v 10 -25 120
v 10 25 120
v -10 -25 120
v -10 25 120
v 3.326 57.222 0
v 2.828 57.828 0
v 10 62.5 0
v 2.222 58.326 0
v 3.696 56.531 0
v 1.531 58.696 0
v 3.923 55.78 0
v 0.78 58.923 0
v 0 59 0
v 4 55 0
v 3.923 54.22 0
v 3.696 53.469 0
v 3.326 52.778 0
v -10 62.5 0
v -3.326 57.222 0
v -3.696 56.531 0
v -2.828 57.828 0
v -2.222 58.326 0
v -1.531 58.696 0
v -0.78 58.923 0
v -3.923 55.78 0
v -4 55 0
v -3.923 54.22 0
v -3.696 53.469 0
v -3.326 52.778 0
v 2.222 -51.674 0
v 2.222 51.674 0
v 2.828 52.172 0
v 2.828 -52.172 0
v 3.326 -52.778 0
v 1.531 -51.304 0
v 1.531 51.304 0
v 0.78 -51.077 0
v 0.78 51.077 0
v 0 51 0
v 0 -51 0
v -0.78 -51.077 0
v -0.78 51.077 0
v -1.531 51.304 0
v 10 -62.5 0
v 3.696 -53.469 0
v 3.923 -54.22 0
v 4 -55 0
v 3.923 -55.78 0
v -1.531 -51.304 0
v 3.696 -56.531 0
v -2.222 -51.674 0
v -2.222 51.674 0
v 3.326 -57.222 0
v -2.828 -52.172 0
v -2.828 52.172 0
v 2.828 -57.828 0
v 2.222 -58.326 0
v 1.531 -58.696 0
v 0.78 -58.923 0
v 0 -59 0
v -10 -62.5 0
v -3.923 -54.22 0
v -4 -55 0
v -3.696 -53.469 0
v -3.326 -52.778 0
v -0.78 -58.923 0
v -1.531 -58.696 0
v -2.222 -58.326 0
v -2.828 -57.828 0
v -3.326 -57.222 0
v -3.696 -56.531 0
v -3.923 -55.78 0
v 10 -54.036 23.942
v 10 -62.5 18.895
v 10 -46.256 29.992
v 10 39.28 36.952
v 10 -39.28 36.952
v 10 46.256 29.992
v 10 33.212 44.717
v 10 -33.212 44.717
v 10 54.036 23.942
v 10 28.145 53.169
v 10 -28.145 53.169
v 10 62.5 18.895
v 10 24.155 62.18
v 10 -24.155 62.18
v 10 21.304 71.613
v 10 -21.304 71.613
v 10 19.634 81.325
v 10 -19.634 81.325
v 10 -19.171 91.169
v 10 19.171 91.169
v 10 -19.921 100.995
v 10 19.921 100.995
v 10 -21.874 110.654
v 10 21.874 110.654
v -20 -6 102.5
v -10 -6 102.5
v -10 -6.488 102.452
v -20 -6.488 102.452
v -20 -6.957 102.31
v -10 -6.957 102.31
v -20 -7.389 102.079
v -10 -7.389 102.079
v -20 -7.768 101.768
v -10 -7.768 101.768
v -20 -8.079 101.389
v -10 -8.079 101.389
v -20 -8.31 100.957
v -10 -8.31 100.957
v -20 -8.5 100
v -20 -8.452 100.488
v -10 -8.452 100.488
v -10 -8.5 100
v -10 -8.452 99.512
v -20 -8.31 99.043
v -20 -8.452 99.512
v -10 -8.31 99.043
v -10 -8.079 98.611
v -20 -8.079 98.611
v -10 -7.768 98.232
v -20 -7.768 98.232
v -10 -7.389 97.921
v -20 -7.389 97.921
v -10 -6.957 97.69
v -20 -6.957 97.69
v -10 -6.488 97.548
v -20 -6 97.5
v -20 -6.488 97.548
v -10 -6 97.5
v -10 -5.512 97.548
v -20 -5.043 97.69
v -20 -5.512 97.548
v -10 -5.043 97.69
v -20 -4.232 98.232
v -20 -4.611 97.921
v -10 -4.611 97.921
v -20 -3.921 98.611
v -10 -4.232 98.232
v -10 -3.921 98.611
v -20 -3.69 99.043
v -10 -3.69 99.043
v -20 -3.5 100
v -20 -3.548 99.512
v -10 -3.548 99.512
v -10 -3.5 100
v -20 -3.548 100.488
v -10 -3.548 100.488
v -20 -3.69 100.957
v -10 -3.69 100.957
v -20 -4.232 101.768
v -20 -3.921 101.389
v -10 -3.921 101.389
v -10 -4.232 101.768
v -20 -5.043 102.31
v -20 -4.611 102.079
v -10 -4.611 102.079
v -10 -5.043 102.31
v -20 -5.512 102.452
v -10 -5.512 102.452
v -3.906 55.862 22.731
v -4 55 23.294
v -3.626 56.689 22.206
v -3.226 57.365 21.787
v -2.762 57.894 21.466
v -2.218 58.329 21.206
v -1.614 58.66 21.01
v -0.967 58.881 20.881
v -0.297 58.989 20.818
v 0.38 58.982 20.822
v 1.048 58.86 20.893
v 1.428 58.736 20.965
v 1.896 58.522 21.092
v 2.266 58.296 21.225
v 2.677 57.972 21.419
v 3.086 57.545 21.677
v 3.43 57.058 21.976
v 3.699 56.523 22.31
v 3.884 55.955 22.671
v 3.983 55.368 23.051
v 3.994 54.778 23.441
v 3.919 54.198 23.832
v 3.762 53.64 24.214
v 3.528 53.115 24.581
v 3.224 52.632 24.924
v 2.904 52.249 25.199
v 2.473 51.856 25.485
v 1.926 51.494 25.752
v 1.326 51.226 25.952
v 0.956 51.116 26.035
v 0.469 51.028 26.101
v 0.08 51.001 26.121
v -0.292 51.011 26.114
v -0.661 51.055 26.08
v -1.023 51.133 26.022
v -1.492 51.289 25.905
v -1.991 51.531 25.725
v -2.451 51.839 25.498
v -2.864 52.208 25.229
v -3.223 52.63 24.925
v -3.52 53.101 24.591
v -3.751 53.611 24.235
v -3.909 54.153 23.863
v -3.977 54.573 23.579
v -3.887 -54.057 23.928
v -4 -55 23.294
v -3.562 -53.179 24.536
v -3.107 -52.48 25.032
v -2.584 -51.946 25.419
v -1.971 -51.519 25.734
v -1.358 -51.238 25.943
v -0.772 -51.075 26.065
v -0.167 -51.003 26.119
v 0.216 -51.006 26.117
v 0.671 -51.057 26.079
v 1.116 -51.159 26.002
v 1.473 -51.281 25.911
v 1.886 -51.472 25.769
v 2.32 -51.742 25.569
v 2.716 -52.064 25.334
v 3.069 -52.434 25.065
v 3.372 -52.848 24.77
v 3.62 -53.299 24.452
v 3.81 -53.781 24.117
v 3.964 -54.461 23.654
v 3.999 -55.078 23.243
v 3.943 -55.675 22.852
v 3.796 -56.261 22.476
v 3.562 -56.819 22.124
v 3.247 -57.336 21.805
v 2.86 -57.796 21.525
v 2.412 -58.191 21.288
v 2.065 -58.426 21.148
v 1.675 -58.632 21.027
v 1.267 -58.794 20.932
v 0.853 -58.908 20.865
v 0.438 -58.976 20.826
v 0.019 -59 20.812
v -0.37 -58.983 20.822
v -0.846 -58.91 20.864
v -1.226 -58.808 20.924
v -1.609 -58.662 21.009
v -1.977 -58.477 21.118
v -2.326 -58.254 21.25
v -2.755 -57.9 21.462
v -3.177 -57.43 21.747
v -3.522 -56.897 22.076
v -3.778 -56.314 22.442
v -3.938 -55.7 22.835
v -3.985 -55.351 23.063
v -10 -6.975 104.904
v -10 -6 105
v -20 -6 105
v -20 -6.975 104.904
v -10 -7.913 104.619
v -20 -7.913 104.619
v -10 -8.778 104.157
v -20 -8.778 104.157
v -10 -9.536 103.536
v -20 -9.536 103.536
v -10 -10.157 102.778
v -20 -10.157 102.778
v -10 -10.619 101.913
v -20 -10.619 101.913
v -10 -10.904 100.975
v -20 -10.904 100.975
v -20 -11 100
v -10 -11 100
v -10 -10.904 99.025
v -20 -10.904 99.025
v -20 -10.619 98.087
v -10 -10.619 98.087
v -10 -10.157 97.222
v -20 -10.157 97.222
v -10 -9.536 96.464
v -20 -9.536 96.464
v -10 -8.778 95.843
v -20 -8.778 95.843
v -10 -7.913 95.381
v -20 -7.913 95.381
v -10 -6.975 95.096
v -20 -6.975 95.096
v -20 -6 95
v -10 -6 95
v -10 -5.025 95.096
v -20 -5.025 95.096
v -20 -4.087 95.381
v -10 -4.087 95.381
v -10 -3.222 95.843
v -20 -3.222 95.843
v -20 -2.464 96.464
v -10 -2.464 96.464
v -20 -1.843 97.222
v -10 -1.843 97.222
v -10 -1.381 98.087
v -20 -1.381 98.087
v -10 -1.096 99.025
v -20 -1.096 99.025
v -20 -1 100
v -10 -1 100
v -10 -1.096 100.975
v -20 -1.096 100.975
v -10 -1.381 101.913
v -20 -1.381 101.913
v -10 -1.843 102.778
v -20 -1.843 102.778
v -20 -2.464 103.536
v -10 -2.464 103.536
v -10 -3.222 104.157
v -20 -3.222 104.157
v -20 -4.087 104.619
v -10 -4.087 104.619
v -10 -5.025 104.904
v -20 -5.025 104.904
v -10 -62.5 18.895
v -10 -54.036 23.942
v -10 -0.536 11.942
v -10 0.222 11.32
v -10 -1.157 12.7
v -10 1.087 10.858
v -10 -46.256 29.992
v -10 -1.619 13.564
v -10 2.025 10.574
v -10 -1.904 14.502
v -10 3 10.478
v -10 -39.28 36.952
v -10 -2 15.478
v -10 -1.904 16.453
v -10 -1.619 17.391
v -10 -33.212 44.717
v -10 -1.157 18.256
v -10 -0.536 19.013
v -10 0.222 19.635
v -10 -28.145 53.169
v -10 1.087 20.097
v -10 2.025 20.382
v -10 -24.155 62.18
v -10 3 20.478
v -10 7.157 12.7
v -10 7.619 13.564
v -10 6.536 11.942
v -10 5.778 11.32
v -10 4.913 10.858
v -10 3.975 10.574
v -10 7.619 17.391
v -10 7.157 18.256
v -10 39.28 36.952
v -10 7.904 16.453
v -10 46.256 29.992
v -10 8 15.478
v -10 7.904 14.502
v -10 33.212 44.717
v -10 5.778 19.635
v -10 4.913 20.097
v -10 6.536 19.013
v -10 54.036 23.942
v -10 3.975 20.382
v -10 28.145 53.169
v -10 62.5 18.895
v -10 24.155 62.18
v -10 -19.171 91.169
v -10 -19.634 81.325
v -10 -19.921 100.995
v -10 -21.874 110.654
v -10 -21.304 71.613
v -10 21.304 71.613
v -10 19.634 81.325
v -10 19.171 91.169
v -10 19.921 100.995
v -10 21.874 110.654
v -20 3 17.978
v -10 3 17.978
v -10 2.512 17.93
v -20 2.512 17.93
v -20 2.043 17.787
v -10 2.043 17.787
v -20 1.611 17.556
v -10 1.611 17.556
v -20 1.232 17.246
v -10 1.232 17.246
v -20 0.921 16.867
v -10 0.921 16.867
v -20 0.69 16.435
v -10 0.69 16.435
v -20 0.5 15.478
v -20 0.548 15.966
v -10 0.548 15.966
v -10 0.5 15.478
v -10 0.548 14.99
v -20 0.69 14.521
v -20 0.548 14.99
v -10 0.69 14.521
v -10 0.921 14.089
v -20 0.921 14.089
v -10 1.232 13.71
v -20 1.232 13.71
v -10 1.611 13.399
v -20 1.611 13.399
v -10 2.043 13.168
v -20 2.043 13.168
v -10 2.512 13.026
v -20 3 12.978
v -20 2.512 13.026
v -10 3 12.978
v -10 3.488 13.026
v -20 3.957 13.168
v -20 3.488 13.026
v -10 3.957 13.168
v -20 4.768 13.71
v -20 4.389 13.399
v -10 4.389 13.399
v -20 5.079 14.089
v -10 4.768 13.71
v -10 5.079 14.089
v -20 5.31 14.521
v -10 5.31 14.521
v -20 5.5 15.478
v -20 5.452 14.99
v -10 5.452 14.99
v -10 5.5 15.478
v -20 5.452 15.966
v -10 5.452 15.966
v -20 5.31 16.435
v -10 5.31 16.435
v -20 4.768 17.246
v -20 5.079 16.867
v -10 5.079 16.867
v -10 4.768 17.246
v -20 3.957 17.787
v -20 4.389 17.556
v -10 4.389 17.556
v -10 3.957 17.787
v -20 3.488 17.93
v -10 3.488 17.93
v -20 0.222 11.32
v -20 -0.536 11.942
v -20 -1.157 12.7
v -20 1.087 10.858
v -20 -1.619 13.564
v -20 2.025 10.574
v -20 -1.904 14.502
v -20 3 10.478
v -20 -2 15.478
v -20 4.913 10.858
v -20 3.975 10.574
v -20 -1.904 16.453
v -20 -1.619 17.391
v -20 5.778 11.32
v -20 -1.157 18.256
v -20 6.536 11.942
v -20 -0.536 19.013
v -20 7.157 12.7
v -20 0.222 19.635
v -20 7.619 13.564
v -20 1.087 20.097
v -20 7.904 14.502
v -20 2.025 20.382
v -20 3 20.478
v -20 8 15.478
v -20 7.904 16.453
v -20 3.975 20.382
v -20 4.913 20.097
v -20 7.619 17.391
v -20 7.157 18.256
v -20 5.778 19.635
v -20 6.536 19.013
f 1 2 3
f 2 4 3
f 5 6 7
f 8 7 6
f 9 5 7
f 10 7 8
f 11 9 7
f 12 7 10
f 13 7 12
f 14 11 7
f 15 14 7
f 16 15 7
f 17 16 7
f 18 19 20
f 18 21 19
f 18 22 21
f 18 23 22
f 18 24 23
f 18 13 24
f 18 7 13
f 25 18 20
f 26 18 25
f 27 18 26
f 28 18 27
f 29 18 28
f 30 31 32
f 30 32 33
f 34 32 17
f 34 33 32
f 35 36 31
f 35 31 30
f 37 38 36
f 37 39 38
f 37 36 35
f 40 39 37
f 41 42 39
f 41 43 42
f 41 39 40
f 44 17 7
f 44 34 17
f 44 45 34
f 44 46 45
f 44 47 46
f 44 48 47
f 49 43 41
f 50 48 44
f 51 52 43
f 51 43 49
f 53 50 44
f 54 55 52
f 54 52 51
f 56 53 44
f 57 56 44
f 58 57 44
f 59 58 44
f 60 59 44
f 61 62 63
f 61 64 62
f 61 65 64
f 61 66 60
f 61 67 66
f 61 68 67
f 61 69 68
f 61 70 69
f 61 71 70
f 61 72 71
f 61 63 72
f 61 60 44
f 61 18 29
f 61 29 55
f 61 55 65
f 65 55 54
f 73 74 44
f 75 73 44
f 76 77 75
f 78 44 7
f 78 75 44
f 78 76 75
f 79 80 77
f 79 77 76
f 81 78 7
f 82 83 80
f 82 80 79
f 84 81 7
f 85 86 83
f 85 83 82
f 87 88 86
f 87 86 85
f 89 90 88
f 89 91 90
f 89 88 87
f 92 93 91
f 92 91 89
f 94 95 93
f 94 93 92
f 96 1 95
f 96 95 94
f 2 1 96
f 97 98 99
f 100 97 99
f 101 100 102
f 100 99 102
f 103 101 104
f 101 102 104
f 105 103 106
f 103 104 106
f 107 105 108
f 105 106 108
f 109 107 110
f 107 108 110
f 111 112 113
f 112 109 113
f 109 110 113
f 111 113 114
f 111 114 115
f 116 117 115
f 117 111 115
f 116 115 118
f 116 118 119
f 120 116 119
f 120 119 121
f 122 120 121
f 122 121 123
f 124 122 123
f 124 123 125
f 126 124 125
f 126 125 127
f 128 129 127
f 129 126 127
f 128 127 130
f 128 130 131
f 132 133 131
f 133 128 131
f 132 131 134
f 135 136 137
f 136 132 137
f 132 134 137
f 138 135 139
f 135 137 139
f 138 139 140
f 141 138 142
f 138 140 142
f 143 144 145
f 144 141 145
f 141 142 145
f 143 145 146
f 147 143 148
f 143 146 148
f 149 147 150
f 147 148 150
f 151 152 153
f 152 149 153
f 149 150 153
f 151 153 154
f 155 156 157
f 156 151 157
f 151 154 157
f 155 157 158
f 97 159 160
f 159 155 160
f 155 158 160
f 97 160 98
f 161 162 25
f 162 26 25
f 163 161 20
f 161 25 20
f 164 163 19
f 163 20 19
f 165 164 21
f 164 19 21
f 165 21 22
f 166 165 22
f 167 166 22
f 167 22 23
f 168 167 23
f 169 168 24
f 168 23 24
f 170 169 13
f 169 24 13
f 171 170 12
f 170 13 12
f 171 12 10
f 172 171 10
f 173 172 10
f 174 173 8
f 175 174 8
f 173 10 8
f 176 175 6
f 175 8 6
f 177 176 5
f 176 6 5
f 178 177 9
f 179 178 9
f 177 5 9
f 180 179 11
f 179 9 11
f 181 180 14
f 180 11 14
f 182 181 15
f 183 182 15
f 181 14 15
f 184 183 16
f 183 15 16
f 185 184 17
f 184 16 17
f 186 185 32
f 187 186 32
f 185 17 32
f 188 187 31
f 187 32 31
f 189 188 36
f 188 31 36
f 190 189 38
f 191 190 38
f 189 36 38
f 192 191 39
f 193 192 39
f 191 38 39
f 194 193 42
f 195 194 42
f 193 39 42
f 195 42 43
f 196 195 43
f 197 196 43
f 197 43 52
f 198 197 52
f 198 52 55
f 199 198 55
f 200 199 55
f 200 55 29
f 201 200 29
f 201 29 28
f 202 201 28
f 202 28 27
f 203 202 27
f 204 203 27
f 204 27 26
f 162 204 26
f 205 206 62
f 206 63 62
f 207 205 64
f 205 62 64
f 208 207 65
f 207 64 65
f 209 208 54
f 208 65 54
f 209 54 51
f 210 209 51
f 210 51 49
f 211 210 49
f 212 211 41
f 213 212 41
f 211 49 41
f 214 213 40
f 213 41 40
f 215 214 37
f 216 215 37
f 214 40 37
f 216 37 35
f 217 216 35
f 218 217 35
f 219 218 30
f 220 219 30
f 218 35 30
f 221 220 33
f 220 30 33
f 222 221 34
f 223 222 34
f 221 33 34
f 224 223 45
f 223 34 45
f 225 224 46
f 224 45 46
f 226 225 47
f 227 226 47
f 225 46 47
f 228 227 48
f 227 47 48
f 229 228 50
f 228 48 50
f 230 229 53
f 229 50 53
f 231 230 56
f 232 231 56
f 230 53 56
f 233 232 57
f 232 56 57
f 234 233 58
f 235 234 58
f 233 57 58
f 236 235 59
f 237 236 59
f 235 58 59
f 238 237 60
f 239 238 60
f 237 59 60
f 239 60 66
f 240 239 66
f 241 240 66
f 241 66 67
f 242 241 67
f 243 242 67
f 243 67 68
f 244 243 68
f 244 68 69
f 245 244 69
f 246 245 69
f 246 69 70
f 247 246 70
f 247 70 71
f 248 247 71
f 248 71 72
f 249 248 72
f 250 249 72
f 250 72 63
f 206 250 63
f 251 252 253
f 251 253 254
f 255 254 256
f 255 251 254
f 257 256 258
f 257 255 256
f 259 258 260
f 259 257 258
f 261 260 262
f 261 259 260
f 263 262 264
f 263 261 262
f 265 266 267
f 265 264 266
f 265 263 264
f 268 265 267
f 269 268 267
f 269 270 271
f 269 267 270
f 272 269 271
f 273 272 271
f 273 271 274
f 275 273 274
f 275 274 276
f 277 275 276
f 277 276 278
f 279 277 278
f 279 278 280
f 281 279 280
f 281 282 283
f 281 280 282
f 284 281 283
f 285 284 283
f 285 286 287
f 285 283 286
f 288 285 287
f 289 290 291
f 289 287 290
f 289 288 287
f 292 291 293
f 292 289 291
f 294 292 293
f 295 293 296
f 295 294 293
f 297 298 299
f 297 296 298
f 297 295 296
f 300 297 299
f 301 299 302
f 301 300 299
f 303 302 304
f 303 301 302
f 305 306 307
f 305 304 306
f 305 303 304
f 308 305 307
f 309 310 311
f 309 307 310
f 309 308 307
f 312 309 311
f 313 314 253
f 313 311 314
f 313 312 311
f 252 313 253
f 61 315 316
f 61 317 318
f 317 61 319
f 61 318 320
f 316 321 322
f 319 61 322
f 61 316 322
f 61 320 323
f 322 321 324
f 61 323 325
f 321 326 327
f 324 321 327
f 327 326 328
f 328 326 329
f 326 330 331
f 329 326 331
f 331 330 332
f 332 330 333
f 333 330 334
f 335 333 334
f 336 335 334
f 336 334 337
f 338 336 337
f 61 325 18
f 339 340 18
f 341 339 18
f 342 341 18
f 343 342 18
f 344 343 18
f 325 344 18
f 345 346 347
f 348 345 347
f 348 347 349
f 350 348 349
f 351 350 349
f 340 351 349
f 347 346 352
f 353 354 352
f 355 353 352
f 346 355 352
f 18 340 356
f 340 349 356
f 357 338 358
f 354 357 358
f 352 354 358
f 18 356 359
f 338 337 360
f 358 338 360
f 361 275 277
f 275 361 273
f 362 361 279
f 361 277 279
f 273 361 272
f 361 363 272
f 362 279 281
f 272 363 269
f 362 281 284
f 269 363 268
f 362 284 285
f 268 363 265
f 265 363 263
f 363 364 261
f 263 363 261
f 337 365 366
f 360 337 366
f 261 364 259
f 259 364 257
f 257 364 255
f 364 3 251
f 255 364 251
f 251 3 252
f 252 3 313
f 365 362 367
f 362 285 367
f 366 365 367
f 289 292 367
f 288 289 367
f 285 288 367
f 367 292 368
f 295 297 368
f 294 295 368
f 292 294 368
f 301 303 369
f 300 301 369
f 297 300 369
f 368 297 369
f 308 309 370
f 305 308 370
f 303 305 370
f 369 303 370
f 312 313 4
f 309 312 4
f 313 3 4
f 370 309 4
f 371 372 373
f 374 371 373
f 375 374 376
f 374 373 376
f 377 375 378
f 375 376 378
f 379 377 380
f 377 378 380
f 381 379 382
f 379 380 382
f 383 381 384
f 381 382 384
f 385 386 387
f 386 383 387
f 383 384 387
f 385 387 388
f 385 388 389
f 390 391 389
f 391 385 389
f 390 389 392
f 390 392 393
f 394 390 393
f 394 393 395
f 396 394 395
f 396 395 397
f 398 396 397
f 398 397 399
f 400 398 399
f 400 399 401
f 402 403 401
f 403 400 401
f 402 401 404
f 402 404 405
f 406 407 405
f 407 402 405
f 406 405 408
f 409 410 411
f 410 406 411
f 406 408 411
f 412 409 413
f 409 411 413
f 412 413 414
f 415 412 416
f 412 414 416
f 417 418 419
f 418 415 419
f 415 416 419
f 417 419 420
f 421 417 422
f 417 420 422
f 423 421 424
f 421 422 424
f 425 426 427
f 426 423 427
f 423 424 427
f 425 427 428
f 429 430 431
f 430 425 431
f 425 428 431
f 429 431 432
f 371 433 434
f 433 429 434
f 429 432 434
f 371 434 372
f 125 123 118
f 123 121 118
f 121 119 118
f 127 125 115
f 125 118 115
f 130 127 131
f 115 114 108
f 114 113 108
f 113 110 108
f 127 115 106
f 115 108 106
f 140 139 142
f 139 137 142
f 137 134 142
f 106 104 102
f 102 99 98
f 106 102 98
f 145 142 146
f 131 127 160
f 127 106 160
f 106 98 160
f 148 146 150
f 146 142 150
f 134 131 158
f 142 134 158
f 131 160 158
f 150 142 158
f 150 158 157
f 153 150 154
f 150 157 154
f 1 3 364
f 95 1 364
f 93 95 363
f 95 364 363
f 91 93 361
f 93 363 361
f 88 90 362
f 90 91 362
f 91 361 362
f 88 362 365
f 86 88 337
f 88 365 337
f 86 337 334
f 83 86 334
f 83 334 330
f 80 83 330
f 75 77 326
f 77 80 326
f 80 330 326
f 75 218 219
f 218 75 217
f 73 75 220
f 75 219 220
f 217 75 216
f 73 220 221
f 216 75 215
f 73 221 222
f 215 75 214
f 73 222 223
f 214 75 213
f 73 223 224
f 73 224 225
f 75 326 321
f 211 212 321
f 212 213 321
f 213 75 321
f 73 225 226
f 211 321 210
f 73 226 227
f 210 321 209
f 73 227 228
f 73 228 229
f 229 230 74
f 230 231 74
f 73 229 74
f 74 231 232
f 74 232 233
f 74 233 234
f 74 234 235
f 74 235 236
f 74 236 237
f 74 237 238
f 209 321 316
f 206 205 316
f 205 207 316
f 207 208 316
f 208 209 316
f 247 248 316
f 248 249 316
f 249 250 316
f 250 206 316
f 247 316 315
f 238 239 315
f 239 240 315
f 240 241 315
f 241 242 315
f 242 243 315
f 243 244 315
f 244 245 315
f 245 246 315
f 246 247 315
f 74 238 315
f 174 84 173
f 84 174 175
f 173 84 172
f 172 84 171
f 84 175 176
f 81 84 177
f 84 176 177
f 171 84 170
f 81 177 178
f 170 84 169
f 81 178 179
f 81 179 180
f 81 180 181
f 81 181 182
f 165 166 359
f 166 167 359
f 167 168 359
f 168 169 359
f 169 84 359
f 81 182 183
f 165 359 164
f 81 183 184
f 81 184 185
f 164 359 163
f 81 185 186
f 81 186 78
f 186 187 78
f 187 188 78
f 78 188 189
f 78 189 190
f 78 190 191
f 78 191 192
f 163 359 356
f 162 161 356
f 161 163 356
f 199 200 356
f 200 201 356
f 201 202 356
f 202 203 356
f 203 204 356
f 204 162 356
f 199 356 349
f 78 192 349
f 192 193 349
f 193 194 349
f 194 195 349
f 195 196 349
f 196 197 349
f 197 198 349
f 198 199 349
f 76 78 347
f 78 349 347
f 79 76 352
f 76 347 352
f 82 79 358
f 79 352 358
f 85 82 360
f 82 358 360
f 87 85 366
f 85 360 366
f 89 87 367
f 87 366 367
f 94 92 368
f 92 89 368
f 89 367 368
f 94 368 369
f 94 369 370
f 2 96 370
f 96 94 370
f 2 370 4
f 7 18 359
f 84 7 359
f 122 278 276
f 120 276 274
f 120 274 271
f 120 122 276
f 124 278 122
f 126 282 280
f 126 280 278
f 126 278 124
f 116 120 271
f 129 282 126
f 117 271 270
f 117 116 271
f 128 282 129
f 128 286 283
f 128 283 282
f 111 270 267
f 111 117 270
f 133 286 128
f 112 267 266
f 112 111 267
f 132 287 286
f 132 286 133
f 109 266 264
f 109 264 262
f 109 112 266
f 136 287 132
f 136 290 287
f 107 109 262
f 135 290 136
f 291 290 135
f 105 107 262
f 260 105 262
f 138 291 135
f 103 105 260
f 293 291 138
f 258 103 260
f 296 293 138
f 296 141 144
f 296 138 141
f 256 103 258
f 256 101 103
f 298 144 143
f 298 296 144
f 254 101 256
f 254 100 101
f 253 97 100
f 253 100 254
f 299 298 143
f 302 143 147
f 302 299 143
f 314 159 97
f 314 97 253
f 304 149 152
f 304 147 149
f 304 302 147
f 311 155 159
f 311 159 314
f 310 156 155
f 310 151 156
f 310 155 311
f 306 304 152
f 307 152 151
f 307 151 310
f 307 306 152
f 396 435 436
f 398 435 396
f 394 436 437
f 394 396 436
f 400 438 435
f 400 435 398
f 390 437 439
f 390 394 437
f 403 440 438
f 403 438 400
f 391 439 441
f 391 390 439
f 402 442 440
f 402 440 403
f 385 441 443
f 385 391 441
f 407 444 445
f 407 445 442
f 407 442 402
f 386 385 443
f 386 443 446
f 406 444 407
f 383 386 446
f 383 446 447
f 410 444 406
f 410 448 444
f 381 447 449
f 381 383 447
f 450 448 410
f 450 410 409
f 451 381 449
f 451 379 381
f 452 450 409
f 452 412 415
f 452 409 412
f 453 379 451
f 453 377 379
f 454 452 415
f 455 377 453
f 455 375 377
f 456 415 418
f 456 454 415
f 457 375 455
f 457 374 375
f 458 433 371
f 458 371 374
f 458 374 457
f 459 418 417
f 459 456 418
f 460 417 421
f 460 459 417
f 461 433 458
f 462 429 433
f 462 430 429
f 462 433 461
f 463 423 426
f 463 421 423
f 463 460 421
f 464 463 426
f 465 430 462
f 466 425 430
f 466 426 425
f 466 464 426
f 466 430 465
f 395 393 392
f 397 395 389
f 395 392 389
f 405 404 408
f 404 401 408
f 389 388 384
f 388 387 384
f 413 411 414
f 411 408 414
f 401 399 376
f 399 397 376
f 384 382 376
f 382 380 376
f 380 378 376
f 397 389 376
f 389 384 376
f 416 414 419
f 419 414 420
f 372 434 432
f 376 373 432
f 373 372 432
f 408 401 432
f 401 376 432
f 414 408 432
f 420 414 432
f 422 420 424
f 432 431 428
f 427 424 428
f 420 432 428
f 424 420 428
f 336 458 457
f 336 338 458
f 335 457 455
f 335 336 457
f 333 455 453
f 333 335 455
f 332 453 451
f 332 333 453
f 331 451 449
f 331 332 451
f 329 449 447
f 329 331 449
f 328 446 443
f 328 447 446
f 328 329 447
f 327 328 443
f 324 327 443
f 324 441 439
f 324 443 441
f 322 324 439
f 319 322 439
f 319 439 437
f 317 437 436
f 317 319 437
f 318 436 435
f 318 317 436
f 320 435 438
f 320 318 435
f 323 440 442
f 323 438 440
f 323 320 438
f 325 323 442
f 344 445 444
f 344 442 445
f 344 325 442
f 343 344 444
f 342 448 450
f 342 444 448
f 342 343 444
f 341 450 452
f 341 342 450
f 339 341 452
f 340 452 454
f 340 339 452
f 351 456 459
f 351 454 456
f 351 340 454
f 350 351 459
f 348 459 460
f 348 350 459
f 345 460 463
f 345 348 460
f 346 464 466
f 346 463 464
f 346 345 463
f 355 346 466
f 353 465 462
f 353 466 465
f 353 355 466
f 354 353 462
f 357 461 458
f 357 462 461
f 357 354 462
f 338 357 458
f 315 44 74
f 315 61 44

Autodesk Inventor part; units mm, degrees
ref_plane "YZ Plane" through (0, 0, 0) normal (1, 0, 0) x (0, 1, 0)
ref_plane "XZ Plane" through (0, 0, 0) normal (0, 1, 0) x (-1, 0, 0)
ref_plane "XY Plane" through (0, 0, 0) normal (0, 0, 1) x (1, 0, 0)
sketch "Sketch1" plane through (0, 0, 0) normal (1, 0, 0) x (0, 1, 0)
  line L0 (0, 144) -> (0, -24) construction
  line L1 (-138.8268, 0) -> (138.8268, 0) construction
  line L2 (-62.5, 0) -> (-62.5, 18.8952)
  line L3 (62.5, 0) -> (62.5, 18.8952)
  line L4 (25, 120) -> (-25, 120)
  line L5 (62.5, 0) -> (-62.5, 0)
  arc A0 (25, 120) -> (62.5, 18.8952) centre (99.162, 90) ccw
  arc A1 (-62.5, 18.8952) -> (-25, 120) centre (-99.162, 90) ccw
  point P0 (0, 0)
  dimension "d0" = 120
  dimension "d1" = 125
  dimension "d3" = 50
  dimension "d4" = 80
  dimension "d6" = 90
extrude "Main Body" add sketch "Sketch1" along normal mid plane 20
sketch "Sketch2" plane through (10, 62.5, 0) normal (0, 0, -1) x (-1, 0, 0)
  line L0 (20, 0) -> (0, 0) projected
  line L1 (10, 0) -> (10, -125) construction
  line L2 (20, -125) -> (0, -125) projected
  line L3 (0, -37.5) -> (0, -87.5) projected
  line L4 (0, -62.5) -> (20, -62.5) construction
  line L5 (20, -87.5) -> (20, -37.5) projected
  circle A0 centre (10, -7.5) radius 4
  circle A1 centre (10, -117.5) radius 4
  point P0 (10, -62.5)
  dimension "d9" = 110
  dimension "d10" = 8
extrude "Upright Mount Holes" cut sketch "Sketch2" against normal through all
sketch "Sketch3" plane through (-10, 0, 0) normal (-1, 0, 0) x (0, 0, 1)
  line L0 (0, 87.5) -> (0, -87.5) construction
  line L1 (-24, 0) -> (144, 0) construction
  circle A0 centre (15.4778, 3) radius 5
  circle A1 centre (100, -6) radius 5
  line L2 (15.4778, 3) -> (100, -6) construction
  circle A2 centre (15.4778, 3) radius 2.5
  circle A3 centre (100, -6) radius 2.5
  point P0 (0, 0)
  dimension "d13" = 6
  dimension "d14" = 3
  dimension "d15" = 100
  dimension "d16" = 85
  dimension "d17" = 10
  dimension "d18" = 5
extrude "Extrusion3" add sketch "Sketch3" along normal blind 10
properties part number "Caliper Bracket Mount V2"
